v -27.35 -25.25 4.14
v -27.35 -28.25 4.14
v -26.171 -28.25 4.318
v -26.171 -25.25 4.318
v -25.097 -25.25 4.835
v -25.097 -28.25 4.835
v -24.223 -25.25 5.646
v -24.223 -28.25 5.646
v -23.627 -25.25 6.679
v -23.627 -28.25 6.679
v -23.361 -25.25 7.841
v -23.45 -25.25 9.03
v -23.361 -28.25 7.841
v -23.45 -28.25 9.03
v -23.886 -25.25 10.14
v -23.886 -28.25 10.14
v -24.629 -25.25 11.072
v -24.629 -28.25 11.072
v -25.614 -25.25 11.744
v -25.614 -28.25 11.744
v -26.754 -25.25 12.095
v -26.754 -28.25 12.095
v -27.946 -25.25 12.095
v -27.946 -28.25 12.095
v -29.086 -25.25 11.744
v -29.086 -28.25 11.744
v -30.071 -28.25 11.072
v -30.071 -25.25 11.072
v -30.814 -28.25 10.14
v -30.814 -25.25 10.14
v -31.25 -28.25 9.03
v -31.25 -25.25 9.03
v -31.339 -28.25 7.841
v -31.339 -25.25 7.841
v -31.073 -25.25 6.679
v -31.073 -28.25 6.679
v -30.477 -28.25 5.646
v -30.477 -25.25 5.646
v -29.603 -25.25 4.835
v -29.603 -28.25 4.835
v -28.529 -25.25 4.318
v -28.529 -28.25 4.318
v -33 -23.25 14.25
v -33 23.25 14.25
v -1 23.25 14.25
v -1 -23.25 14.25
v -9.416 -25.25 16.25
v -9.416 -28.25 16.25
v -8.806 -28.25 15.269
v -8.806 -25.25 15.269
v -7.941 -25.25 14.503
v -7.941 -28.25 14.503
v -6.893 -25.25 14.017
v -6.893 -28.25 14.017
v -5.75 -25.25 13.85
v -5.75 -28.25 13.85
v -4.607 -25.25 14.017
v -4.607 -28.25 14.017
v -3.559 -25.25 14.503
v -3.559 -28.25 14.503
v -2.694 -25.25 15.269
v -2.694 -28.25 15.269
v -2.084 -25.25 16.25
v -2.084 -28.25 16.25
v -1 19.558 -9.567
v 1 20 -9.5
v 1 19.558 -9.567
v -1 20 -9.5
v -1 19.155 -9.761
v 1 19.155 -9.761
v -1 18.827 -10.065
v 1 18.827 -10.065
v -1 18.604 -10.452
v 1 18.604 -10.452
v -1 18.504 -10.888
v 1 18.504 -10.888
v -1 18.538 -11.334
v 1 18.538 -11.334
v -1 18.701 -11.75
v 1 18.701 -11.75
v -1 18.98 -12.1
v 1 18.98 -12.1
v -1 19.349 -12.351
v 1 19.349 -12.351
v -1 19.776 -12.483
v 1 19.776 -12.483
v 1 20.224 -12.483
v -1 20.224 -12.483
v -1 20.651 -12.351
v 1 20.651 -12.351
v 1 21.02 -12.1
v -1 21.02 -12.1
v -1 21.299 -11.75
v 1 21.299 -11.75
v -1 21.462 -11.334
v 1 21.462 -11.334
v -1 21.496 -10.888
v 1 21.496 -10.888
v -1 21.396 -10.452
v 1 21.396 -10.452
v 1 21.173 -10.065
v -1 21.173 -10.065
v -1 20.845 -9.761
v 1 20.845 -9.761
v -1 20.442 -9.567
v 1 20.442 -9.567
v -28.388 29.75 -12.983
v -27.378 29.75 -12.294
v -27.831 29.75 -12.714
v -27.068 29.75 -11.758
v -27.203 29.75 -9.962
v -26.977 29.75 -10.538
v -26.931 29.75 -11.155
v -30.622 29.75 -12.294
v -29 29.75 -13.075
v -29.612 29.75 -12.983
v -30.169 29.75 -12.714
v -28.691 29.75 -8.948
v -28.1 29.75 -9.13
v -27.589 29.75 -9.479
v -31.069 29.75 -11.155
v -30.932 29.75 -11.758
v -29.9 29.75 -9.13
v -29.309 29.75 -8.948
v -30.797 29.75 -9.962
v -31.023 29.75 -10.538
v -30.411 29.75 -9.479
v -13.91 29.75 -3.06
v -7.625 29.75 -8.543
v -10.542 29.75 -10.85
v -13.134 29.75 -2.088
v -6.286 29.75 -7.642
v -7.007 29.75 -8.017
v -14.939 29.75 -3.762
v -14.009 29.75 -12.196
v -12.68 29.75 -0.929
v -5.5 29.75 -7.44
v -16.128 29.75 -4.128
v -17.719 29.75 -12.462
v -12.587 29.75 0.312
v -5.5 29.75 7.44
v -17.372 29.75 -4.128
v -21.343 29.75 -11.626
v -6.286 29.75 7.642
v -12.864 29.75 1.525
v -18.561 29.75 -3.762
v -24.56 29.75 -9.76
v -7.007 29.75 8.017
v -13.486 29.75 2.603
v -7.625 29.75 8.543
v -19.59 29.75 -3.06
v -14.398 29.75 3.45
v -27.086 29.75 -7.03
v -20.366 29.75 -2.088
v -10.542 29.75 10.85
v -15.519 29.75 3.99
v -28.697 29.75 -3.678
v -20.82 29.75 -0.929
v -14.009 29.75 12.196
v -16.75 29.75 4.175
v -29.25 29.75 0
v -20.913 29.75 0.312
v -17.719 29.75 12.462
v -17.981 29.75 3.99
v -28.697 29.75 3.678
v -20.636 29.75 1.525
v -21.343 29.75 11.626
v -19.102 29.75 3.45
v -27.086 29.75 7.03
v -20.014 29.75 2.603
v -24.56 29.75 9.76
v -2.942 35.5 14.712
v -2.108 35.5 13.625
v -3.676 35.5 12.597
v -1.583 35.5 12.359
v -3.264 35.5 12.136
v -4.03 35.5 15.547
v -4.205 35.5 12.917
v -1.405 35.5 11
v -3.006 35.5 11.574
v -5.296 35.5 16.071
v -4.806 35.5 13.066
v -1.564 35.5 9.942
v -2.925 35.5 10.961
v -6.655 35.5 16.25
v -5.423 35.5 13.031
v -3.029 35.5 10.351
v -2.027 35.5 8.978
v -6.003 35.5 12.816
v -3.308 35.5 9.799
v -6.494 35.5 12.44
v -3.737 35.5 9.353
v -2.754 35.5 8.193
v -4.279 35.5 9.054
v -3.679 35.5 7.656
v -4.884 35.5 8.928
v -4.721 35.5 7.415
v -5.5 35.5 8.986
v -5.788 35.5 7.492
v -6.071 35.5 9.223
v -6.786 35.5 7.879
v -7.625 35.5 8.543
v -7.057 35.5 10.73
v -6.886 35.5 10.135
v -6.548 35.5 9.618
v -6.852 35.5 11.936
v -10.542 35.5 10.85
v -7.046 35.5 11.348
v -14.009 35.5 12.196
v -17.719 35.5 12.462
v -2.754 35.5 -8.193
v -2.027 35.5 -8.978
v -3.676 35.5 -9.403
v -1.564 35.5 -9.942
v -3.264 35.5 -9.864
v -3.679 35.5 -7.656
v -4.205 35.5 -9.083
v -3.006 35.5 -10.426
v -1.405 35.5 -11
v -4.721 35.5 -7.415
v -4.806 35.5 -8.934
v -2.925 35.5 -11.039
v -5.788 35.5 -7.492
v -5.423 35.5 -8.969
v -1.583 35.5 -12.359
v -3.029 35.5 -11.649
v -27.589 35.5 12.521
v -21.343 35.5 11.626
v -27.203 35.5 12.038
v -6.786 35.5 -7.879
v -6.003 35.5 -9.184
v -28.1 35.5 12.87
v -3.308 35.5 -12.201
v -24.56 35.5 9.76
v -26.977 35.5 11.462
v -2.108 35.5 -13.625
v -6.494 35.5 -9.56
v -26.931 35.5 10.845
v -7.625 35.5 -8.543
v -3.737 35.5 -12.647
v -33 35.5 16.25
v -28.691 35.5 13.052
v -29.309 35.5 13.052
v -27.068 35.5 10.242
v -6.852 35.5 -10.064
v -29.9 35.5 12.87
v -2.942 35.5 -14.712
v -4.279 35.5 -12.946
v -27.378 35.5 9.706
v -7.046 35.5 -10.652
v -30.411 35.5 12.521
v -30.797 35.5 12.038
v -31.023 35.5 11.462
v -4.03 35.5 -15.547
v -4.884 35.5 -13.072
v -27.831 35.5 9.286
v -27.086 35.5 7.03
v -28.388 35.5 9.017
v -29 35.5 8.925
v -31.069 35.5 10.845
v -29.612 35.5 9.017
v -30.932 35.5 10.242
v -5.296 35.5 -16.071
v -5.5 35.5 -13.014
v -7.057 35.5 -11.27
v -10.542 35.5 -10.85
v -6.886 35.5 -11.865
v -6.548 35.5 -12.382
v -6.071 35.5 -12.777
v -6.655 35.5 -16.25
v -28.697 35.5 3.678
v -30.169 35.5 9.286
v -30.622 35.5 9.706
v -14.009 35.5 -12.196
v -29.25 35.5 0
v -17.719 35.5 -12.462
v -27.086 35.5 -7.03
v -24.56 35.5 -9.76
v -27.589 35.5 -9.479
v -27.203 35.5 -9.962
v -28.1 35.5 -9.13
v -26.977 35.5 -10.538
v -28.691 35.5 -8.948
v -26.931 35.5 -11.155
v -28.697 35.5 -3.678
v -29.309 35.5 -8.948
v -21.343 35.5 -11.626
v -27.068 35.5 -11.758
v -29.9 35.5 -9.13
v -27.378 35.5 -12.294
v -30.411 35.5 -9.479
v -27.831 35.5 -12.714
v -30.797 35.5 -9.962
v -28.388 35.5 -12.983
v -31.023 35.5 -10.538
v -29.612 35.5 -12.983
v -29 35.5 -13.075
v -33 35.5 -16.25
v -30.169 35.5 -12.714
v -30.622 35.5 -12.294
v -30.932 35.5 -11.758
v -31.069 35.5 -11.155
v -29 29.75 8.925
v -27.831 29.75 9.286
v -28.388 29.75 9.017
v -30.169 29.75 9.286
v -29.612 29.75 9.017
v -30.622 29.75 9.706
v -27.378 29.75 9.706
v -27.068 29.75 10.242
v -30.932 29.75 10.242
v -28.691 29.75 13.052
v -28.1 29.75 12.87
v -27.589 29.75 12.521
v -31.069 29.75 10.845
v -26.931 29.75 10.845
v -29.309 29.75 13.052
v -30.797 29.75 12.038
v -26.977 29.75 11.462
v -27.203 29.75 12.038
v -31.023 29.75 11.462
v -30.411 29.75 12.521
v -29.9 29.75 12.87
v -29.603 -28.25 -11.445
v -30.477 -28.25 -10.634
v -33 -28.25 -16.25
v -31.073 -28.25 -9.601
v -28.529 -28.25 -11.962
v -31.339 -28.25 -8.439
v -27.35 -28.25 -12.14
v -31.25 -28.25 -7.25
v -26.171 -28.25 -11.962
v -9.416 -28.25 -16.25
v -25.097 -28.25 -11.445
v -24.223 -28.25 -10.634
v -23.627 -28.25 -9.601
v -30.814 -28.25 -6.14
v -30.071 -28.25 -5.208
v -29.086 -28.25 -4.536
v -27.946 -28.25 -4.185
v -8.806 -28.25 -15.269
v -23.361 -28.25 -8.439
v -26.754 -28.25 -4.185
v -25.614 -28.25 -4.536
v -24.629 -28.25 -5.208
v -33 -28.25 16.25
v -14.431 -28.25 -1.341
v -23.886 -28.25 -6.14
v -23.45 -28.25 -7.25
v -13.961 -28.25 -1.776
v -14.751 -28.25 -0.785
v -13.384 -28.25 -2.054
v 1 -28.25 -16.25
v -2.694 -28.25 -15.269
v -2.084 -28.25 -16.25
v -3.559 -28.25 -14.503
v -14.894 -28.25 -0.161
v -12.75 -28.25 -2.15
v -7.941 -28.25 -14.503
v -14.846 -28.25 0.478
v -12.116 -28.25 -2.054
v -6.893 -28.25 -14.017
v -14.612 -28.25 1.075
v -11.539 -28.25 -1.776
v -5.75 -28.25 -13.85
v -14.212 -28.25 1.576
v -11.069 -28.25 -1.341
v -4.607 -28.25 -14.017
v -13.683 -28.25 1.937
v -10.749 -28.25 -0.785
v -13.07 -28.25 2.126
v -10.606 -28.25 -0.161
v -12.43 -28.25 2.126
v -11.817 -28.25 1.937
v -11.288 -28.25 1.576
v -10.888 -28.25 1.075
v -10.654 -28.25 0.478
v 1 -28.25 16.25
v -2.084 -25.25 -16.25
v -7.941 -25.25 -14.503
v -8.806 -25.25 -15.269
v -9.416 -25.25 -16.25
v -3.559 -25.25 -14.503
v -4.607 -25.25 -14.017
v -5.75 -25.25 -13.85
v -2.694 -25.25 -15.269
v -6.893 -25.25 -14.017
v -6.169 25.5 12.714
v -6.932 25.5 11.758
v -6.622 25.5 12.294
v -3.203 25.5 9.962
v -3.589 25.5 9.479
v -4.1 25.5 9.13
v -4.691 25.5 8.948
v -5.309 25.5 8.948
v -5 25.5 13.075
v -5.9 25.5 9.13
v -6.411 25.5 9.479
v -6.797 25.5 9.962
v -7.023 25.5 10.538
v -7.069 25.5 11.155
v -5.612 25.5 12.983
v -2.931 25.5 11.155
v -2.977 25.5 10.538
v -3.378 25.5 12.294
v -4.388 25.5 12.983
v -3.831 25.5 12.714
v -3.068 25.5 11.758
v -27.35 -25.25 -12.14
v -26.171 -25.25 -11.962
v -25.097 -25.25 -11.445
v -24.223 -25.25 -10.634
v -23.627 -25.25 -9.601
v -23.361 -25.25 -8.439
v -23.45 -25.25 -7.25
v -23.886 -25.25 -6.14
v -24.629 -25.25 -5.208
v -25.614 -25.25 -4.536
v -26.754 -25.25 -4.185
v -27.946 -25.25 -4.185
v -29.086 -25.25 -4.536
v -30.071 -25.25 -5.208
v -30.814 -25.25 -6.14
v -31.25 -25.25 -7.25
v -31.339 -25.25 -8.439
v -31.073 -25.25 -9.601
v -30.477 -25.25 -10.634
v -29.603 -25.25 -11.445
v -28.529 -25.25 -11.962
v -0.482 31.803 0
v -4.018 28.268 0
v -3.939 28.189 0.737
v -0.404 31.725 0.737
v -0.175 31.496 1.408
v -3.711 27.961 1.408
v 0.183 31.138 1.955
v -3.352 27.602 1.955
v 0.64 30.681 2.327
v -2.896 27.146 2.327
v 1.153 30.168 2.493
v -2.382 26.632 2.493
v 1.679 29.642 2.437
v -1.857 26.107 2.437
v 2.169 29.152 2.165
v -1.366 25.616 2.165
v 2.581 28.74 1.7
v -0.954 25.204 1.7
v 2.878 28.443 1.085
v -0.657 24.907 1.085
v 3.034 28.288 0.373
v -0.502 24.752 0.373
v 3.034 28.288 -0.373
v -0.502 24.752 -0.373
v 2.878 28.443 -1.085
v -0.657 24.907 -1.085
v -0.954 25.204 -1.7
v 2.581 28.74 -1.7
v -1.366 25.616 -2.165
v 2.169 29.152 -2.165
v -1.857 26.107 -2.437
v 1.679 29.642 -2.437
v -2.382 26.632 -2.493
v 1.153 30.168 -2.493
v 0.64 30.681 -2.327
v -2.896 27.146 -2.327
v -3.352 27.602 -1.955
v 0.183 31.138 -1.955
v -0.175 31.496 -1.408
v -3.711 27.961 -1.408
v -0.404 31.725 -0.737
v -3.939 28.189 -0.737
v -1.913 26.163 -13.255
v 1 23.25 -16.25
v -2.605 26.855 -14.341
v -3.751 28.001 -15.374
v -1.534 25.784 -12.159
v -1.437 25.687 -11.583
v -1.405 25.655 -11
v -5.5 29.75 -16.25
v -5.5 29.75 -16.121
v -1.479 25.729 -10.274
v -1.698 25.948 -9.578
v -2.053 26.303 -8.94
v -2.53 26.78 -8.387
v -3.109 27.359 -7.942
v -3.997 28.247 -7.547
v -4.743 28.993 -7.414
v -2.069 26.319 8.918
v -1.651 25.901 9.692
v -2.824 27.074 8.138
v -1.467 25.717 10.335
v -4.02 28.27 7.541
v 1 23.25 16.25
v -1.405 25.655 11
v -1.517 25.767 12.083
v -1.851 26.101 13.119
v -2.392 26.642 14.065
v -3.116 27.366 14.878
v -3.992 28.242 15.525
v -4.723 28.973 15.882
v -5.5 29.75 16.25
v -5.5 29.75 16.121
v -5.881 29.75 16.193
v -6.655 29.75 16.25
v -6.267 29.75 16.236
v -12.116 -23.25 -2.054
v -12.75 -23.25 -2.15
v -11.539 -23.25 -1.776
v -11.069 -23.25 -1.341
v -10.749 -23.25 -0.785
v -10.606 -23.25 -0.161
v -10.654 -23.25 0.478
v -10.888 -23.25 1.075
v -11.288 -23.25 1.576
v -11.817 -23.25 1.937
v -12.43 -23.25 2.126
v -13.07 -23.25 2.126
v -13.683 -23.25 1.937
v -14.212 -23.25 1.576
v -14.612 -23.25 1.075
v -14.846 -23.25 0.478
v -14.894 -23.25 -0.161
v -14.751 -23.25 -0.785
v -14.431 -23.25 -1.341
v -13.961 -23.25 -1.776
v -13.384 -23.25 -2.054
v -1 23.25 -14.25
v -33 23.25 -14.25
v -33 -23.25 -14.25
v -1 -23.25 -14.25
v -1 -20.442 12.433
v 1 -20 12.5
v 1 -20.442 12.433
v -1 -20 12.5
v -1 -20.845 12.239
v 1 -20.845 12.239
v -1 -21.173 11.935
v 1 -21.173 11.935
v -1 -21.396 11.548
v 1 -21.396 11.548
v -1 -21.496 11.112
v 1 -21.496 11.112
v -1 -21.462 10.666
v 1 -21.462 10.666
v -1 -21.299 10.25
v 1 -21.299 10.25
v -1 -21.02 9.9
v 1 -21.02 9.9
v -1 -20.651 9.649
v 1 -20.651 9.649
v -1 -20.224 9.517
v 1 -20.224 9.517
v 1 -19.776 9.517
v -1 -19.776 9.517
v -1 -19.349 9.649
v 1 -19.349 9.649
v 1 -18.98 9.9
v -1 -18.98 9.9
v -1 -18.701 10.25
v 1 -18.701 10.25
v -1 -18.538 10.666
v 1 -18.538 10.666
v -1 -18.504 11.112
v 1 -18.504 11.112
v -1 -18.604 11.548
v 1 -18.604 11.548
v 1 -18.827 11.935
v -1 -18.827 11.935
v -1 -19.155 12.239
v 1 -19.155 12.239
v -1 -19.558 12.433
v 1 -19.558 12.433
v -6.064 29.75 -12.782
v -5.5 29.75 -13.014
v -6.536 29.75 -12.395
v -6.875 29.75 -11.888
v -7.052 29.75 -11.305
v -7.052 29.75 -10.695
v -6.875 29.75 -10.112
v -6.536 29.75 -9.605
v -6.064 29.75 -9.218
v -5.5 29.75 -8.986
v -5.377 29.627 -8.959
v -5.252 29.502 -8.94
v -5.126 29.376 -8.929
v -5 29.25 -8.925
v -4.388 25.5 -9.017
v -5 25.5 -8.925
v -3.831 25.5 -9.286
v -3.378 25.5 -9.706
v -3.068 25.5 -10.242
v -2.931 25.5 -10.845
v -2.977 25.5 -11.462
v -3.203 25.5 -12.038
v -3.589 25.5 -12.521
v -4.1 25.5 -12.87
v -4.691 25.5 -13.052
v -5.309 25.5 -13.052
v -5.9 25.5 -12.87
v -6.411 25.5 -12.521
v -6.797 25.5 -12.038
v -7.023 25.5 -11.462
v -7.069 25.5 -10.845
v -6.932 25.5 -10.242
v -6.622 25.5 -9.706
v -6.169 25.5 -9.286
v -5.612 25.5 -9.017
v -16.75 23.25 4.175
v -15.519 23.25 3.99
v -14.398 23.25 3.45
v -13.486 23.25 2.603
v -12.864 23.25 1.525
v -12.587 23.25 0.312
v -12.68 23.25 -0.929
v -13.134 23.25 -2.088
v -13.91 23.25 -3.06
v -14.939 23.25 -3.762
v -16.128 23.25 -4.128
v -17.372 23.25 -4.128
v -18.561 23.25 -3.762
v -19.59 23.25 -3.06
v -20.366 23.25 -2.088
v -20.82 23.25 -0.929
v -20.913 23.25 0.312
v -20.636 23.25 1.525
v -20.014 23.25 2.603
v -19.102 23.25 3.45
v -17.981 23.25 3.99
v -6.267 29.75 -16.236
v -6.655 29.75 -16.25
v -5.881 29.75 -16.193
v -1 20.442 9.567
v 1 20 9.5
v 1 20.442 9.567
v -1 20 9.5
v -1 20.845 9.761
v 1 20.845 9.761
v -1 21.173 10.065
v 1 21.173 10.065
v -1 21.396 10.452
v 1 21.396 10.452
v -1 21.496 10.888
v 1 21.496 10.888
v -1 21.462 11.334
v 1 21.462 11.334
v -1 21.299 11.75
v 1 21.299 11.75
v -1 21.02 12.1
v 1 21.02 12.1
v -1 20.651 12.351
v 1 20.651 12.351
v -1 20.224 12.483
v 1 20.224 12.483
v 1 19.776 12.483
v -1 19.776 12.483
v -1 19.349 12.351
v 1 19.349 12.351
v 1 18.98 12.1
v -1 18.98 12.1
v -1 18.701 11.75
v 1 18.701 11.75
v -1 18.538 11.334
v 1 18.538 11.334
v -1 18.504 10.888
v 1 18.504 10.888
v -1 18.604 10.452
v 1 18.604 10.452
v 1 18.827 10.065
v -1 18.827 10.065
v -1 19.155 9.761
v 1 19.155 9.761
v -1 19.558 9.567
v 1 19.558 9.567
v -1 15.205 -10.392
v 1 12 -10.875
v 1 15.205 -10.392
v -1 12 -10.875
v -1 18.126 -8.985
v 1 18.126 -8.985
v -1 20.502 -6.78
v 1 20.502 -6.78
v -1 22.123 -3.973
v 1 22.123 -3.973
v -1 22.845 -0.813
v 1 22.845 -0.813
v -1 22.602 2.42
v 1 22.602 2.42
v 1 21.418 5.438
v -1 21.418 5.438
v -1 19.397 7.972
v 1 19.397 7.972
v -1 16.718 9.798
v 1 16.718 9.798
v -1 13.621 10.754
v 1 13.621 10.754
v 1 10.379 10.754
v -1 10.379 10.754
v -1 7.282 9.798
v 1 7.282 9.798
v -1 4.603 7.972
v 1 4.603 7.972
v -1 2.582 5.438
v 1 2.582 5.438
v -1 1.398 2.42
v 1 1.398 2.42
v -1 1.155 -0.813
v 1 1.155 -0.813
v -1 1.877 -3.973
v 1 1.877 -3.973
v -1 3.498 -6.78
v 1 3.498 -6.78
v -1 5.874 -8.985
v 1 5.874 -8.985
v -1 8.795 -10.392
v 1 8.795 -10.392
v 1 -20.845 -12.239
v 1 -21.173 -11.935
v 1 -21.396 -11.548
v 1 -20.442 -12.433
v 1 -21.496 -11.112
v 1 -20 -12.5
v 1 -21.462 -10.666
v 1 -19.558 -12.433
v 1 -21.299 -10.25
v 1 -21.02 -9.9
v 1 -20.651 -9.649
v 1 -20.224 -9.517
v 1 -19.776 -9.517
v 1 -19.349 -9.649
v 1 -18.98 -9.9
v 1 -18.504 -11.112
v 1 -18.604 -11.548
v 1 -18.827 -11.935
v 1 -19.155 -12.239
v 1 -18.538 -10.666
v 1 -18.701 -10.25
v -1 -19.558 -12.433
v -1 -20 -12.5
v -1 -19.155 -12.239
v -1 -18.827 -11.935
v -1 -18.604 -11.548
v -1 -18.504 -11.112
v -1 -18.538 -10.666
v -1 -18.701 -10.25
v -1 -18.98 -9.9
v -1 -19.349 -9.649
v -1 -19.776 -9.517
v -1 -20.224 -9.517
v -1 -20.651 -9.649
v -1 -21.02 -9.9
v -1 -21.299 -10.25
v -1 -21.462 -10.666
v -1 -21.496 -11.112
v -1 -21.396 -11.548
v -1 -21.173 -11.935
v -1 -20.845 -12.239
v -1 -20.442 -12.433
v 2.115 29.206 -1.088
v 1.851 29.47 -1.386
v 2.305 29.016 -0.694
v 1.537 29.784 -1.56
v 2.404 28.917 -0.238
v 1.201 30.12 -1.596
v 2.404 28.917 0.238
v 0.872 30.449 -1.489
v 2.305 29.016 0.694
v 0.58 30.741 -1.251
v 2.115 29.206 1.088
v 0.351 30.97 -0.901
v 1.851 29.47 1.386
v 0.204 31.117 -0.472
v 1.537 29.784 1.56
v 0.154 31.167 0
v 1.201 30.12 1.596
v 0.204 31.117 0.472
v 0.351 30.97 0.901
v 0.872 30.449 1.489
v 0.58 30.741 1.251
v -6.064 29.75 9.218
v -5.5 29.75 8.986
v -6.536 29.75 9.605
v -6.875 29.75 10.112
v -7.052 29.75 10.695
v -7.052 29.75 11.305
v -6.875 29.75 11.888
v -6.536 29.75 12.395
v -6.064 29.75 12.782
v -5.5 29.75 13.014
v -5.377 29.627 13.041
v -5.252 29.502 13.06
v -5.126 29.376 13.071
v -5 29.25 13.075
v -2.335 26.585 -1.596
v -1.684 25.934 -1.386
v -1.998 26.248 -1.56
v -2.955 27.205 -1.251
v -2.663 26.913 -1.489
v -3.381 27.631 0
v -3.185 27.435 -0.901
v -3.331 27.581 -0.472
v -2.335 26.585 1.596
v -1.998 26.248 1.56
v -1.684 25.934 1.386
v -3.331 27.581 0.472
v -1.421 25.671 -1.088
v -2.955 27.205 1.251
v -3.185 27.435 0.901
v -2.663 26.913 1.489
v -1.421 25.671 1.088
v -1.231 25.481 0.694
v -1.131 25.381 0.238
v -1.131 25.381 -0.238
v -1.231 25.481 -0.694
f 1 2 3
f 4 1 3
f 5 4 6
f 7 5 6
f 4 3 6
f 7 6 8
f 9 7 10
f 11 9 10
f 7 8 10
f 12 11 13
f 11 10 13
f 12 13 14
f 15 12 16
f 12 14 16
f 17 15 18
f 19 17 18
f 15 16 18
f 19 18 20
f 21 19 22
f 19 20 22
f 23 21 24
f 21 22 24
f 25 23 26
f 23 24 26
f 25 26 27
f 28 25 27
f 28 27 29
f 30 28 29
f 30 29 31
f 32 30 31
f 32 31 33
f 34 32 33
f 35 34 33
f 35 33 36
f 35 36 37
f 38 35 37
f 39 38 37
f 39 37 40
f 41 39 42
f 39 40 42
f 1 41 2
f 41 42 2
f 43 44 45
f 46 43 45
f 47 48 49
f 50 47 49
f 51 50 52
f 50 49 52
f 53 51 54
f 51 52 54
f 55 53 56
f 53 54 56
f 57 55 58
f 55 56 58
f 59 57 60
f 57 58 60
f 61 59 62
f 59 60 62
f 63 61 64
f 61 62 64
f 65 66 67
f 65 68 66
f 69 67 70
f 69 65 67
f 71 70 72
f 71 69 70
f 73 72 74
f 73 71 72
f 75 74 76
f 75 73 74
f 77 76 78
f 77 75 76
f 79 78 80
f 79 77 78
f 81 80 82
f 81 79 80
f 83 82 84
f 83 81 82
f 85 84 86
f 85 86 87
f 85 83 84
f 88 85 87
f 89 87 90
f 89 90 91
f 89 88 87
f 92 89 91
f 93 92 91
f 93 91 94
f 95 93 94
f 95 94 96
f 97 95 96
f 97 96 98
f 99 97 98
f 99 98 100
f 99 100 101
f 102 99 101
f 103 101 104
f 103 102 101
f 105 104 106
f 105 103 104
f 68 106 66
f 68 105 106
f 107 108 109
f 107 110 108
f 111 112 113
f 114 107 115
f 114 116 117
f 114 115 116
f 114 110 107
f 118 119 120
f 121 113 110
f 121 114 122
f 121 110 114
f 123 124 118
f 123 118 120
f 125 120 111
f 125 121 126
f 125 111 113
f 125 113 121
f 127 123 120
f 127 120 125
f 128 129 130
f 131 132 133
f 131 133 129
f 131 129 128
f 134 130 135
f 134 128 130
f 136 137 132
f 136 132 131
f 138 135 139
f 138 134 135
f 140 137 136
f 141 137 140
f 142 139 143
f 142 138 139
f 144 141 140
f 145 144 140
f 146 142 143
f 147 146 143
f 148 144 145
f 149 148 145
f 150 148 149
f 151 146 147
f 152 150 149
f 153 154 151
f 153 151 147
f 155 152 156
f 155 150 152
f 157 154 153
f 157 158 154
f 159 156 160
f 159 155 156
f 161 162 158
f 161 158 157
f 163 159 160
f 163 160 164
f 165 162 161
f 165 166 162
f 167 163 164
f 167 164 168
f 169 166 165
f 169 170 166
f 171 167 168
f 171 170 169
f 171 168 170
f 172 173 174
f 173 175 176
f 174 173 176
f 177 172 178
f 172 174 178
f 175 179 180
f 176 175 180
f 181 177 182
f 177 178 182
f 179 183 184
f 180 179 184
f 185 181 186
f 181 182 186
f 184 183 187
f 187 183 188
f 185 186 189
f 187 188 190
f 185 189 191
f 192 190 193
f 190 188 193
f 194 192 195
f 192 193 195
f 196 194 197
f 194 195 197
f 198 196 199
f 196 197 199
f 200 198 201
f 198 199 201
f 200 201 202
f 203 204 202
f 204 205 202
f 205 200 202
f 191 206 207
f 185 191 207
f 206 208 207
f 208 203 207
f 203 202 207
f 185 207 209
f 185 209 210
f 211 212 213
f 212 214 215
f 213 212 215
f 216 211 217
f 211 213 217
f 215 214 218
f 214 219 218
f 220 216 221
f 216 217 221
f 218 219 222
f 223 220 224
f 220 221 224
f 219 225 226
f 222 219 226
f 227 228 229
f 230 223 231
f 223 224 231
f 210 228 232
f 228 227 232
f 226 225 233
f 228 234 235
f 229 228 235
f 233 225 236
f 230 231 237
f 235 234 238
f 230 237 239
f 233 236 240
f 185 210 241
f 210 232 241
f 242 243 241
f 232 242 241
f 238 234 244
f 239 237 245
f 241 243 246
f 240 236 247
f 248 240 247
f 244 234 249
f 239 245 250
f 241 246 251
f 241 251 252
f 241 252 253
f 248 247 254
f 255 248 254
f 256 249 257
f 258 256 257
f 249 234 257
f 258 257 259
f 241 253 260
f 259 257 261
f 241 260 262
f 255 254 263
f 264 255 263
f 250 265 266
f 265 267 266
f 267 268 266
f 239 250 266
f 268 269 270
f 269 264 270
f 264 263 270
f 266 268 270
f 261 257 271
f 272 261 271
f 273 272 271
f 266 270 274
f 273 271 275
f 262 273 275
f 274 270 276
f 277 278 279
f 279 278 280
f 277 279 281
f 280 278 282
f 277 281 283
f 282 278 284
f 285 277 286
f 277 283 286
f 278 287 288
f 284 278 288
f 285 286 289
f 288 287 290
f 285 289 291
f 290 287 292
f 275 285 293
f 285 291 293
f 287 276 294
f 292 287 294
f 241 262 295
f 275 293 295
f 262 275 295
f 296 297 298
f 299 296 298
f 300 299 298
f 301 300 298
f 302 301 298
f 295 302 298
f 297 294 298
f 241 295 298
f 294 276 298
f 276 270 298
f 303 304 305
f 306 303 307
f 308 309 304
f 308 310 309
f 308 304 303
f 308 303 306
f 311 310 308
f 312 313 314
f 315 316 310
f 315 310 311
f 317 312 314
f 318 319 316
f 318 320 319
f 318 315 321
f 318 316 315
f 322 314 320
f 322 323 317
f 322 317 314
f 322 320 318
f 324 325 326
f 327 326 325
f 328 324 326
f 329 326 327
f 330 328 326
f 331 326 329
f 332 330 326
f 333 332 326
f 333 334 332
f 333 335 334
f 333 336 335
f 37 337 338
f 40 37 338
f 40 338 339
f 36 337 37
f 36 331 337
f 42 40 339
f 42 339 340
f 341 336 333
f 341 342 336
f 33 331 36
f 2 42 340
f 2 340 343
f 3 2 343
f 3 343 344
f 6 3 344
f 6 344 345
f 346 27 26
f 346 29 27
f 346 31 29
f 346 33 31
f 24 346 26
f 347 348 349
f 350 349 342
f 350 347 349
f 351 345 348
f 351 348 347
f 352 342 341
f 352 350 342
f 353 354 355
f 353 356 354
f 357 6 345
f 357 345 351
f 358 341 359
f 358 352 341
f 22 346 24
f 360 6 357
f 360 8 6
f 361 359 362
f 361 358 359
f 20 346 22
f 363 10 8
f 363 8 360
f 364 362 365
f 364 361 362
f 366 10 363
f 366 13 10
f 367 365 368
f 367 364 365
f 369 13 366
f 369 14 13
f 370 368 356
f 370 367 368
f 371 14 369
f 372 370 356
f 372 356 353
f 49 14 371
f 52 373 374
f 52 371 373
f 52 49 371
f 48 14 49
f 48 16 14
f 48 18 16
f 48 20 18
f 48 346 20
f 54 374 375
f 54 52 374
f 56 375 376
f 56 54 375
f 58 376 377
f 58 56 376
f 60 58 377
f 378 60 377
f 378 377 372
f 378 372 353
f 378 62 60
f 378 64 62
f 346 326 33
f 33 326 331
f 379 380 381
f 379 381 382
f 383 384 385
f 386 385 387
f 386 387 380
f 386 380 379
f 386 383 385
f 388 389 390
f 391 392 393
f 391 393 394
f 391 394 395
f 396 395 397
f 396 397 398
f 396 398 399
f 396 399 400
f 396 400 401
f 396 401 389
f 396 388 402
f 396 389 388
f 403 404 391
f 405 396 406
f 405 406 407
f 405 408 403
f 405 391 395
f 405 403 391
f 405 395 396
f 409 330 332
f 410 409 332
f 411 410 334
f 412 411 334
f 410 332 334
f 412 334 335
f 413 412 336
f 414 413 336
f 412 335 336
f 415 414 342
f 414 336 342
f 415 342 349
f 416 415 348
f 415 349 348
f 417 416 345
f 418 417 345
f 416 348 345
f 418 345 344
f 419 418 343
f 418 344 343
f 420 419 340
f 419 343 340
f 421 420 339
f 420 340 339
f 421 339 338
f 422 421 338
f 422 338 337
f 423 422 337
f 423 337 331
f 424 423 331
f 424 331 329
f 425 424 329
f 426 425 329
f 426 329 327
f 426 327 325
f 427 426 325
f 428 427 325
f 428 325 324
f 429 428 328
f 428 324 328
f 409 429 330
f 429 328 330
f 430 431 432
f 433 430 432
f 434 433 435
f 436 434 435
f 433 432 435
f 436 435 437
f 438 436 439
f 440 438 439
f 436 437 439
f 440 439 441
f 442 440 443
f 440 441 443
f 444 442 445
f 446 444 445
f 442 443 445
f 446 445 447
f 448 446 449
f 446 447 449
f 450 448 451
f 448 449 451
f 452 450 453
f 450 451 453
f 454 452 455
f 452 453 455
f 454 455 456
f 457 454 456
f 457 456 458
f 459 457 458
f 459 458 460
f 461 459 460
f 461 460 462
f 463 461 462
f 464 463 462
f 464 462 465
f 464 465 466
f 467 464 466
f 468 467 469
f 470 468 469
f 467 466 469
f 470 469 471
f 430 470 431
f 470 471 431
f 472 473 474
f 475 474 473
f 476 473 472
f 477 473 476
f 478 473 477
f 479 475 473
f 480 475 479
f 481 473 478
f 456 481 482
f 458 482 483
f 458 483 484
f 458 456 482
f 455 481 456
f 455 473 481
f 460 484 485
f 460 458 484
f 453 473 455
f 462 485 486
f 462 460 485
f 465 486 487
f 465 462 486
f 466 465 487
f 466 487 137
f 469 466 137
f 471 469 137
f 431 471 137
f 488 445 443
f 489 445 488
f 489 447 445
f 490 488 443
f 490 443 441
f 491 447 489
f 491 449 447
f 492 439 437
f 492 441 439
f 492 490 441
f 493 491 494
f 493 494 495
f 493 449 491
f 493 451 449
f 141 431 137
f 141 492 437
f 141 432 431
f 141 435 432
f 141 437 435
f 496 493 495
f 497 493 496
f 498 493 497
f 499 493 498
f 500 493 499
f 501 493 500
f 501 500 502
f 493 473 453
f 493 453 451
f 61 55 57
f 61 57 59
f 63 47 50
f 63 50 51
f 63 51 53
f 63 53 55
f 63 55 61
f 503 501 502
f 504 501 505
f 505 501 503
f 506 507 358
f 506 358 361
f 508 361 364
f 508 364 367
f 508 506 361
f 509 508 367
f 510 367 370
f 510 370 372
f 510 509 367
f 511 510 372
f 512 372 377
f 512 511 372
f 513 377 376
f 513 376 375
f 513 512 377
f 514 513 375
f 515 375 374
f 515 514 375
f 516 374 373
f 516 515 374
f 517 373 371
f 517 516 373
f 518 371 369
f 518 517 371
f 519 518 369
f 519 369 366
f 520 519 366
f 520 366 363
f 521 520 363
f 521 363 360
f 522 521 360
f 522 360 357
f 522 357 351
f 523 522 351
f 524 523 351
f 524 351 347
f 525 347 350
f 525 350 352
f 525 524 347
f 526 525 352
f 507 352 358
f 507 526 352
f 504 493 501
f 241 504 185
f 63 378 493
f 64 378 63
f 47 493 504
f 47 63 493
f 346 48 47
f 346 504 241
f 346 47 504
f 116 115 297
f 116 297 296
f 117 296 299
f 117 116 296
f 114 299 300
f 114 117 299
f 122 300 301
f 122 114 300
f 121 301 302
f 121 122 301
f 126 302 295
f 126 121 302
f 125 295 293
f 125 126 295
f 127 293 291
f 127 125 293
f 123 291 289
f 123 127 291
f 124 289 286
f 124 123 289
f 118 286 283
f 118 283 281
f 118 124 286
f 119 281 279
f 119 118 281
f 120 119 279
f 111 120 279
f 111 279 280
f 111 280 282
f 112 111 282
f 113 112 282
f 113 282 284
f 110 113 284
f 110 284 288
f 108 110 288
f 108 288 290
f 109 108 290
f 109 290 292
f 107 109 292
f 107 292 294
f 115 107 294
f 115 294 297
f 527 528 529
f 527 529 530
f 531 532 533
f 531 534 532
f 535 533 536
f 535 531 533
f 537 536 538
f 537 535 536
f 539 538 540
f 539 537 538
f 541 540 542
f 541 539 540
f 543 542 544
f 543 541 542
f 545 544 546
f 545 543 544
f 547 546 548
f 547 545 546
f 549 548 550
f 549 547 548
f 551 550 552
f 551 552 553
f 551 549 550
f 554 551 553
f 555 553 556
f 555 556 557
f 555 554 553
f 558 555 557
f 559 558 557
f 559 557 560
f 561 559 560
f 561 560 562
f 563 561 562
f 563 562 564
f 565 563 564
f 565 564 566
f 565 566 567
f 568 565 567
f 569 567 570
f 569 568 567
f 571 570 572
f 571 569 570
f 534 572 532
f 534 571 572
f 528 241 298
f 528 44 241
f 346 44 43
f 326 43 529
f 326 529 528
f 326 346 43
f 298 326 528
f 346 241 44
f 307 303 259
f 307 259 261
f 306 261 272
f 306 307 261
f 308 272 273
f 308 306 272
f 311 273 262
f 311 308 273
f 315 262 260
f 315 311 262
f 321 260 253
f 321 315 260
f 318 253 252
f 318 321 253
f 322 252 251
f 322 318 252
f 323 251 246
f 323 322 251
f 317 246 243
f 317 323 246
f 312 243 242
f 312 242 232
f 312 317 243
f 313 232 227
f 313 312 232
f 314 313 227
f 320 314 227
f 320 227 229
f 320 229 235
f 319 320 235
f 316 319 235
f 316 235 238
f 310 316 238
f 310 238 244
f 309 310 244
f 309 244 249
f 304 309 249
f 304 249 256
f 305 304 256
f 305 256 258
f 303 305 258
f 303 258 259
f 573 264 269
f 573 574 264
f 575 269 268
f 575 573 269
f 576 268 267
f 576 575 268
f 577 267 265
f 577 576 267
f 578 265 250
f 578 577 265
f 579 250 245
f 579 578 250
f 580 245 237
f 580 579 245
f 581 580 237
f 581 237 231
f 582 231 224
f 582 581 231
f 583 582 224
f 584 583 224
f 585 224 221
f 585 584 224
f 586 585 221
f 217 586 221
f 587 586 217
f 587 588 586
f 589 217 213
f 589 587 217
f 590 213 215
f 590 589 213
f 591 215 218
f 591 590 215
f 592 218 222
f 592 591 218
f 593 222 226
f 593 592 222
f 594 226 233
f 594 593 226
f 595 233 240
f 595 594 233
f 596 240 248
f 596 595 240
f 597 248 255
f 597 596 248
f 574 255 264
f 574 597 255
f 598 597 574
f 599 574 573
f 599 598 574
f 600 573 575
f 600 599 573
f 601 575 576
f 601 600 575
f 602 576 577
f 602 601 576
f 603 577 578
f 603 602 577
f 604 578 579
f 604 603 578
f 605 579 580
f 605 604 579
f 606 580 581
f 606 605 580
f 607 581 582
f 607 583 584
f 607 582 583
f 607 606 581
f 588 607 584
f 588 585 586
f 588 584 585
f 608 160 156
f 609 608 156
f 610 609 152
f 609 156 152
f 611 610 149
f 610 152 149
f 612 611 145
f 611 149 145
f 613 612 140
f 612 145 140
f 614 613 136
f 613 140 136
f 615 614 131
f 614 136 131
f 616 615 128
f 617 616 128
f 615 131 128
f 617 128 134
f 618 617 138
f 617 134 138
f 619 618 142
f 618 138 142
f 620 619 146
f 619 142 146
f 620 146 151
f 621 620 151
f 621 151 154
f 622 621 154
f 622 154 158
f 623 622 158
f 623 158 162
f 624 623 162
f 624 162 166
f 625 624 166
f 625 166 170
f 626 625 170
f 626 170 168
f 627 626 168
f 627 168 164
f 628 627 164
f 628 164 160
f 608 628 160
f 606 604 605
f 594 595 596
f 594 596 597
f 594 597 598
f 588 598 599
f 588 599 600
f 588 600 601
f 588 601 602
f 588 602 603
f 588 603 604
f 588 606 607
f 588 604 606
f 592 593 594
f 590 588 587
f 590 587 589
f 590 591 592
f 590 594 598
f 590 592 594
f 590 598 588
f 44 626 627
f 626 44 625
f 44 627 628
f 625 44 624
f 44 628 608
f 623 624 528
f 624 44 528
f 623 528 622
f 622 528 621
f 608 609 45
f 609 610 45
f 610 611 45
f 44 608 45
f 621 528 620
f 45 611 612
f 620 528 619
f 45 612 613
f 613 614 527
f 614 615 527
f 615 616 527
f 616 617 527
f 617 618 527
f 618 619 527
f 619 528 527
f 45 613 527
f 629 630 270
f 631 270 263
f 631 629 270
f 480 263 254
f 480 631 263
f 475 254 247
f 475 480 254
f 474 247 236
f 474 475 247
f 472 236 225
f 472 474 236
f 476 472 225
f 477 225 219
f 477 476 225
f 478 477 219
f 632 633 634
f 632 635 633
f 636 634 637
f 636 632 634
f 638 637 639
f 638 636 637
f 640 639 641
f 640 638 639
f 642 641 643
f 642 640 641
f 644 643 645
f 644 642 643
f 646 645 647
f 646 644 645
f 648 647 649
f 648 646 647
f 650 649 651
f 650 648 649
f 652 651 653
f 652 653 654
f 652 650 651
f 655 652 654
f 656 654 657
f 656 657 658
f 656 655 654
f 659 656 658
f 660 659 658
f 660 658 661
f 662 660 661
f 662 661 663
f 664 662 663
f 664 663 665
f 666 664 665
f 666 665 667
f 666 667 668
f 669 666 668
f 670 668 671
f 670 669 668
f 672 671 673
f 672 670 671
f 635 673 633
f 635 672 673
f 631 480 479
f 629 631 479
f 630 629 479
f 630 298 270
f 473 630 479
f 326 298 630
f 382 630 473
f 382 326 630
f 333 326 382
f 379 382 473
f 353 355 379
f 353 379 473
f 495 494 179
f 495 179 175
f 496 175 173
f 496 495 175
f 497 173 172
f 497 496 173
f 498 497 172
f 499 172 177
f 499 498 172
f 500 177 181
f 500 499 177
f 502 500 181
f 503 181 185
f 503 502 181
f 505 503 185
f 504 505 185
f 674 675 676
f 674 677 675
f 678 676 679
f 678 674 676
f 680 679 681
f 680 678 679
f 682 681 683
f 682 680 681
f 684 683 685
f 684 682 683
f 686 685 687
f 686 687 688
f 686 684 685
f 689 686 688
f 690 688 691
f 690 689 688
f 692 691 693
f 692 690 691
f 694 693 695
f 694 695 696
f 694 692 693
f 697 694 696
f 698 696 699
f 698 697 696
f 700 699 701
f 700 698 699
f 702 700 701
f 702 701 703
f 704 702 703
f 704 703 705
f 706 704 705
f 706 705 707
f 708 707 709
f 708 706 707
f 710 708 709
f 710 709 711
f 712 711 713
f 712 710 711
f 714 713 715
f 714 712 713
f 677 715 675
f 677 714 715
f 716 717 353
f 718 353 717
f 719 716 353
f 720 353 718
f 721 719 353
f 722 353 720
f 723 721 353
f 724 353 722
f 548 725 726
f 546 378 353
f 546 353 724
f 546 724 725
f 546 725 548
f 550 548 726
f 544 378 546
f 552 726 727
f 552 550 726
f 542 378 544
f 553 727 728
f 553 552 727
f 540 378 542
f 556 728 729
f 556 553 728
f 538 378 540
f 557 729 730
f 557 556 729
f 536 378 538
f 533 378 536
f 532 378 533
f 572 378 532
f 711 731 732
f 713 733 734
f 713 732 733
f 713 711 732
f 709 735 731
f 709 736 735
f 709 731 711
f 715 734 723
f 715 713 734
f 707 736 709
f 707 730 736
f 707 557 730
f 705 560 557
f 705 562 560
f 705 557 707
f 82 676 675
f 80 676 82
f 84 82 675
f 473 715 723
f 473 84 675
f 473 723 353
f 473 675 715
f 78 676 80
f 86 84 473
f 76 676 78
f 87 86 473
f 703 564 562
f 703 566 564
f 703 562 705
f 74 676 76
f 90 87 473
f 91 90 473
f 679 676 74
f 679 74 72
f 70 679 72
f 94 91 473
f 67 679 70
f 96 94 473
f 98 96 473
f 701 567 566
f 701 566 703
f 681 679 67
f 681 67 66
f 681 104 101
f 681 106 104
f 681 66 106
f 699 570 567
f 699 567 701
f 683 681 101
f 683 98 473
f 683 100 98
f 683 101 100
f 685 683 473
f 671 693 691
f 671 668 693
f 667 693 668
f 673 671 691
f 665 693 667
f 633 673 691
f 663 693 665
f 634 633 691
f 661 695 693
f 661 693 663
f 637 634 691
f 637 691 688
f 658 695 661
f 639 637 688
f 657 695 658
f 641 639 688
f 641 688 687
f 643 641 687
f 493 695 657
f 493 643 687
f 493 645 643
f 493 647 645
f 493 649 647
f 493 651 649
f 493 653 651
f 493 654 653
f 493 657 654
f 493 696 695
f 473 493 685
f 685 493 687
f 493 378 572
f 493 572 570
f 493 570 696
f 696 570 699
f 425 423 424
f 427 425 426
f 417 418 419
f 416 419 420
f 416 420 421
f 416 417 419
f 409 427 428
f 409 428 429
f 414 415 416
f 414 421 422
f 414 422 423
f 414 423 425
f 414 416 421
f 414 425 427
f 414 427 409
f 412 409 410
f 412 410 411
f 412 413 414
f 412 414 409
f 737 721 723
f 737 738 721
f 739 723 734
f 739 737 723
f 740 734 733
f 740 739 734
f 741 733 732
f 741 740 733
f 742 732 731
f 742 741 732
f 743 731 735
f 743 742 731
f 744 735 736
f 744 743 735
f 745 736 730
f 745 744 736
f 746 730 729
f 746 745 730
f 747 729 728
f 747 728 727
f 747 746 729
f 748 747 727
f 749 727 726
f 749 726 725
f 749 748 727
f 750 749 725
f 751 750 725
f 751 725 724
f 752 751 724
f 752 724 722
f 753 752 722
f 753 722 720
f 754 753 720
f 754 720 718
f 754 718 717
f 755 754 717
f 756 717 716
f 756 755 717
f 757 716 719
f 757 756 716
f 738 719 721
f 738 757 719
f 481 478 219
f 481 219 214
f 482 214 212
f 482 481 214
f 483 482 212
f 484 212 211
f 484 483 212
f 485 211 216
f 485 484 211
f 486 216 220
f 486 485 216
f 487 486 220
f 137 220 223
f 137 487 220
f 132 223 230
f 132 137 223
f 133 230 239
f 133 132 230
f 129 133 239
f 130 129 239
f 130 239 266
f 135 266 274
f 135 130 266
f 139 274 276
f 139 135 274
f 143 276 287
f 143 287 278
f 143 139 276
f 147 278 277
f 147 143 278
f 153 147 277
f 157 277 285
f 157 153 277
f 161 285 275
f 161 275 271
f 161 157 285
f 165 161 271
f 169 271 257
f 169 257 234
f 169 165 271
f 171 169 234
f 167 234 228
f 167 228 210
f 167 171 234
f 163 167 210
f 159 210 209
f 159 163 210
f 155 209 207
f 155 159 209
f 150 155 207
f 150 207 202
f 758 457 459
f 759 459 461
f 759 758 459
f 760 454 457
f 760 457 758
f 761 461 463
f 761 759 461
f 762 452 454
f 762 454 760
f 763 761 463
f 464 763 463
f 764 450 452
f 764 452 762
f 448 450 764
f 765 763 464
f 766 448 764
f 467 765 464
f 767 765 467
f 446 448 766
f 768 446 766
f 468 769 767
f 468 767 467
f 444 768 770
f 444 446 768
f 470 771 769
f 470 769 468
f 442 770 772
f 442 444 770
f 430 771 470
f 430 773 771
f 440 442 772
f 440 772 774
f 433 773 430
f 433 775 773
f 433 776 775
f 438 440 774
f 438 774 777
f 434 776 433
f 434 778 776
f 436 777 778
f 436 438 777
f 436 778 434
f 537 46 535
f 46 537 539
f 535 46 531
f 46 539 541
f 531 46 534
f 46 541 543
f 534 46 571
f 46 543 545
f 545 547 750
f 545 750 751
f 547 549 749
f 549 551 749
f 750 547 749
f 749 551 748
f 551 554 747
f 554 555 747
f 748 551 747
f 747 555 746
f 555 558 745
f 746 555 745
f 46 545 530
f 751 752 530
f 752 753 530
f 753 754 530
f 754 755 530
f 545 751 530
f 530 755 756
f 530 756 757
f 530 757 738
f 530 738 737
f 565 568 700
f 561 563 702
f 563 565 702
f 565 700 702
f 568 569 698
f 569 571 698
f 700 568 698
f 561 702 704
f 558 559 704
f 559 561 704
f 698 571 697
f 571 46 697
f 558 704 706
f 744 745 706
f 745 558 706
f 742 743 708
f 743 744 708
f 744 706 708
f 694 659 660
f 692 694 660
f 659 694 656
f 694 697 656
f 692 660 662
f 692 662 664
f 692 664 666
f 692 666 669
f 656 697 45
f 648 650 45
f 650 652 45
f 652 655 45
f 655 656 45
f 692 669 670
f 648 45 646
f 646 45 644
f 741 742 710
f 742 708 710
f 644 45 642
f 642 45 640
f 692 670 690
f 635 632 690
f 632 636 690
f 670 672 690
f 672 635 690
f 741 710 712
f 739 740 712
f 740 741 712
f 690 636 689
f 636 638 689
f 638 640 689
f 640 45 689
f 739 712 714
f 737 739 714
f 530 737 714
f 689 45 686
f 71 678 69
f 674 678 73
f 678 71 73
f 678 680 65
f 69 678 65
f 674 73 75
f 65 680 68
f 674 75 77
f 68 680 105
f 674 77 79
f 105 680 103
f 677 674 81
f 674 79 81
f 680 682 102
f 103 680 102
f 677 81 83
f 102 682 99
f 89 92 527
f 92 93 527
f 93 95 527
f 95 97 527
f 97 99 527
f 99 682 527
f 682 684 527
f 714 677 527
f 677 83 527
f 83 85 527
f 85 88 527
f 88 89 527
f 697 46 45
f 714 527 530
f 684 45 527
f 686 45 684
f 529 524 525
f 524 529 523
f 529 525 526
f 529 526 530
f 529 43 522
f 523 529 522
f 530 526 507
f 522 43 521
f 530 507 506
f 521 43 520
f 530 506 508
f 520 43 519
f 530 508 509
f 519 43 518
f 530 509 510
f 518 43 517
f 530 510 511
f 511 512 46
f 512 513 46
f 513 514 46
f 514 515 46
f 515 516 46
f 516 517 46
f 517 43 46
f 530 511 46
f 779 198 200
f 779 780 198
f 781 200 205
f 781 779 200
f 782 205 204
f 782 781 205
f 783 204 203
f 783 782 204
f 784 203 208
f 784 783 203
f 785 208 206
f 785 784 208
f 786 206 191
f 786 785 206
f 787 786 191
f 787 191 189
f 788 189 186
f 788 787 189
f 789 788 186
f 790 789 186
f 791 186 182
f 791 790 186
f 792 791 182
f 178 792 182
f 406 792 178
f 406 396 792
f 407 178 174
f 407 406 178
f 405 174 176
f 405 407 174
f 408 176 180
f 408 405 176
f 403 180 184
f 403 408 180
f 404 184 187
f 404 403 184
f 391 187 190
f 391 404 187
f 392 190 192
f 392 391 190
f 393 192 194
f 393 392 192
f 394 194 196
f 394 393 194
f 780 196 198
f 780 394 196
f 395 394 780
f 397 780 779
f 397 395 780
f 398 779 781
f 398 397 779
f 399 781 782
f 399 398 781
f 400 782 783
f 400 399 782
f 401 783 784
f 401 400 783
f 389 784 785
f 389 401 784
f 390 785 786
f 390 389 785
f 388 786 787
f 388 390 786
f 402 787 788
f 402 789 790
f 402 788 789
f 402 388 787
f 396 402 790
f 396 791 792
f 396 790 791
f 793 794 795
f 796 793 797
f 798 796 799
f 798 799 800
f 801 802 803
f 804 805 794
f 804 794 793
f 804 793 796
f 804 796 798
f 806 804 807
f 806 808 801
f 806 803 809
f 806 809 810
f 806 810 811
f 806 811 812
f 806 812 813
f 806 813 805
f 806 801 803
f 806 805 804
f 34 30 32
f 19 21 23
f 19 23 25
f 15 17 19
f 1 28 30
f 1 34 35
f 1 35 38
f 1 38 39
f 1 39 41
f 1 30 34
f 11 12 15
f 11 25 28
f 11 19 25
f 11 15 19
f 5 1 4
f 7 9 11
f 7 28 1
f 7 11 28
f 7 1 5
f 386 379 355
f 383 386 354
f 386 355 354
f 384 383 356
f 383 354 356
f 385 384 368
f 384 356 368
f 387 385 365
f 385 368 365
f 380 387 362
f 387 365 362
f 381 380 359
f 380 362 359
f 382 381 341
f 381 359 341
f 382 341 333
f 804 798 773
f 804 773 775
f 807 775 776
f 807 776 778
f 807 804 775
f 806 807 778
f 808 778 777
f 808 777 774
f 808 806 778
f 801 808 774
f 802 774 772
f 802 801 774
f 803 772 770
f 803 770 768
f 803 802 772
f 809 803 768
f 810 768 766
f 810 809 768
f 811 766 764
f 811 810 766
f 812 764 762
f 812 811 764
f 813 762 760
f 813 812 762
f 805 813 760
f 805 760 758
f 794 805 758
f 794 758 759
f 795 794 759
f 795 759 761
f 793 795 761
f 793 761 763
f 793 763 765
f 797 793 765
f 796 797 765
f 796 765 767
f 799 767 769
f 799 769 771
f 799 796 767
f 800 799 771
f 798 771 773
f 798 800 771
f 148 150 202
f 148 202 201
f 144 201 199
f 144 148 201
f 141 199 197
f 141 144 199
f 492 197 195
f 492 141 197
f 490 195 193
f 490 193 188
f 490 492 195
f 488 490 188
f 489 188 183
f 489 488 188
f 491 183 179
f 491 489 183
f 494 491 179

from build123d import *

# Parameters (mm, degrees)
SKETCH1_W           = 28.5
SKETCH1_H           = 46.5
SKETCH1_R           = 1.5
SKETCH1_R_2         = 10.875
BOSS_EXTRUDE1_DEPTH = 1
SKETCH2_W           = 34
SKETCH2_H           = 28.5
BOSS_EXTRUDE2_DEPTH = 6.5
CUT_EXTRUDE1_REACH  = 66.04
SKETCH4_R           = 4.175
SKETCH15_W          = 34
SKETCH15_H          = 28.5
SKETCH15_R          = 2.15
BOSS_EXTRUDE8_DEPTH = 5
CHAMFER1_SIZE       = 6.5
BOSS_EXTRUDE9_DEPTH = 2
SKETCH5_R           = 2.5
BOSS_EXTRUDE4_DEPTH = 5
CUT_EXTRUDE4_START  = -5
SKETCH7_R           = 1.6
CUT_EXTRUDE4_DEPTH  = 5
SKETCH10_R          = 2.075
BOSS_EXTRUDE6_DEPTH = 12.25
CUT_EXTRUDE7_START  = -10
SKETCH18_R          = 2.075
CUT_EXTRUDE7_DEPTH  = 10
SKETCH19_R          = 4
CUT_EXTRUDE8_DEPTH  = 3


with BuildPart() as part:
    # Sketch1 → Boss-Extrude1 (new, symmetric)
    with BuildSketch(Plane(origin=(0, 0, 0), x_dir=(0, 0, -1), z_dir=(1, 0, 0))):
        Rectangle(SKETCH1_W, SKETCH1_H)
        with Locations((-11, 20)):
            Circle(SKETCH1_R, mode=Mode.SUBTRACT)
        with Locations(Location((11, 20, 0), (0, 0, 180))):
            Circle(SKETCH1_R, mode=Mode.SUBTRACT)
        with Locations((11, -20)):
            Circle(SKETCH1_R, mode=Mode.SUBTRACT)
        with Locations(Location((-11, -20, 0), (0, 0, 180))):
            Circle(SKETCH1_R, mode=Mode.SUBTRACT)
        with Locations((0, 12)):
            Circle(SKETCH1_R_2, mode=Mode.SUBTRACT)
    extrude(amount=BOSS_EXTRUDE1_DEPTH, both=True)

    # Sketch2 → Boss-Extrude2 (add)
    with BuildSketch(Plane(origin=(0, 23.25, 0), x_dir=(1, 0, 0), z_dir=(0, 1, 0))):
        with Locations((-16, 0)):
            Rectangle(SKETCH2_W, SKETCH2_H)
    extrude(amount=BOSS_EXTRUDE2_DEPTH)

    # Sketch4 → Cut-Extrude1 (cut, up to next)
    with BuildSketch(Plane(origin=(0, 29.75, 0), x_dir=(1, 0, 0), z_dir=(0, 1, 0)), mode=Mode.PRIVATE) as cut_extrude1_sk1:
        with Locations(Location((-16.75, 0, 0), (0, 0, 270))):
            Circle(SKETCH4_R)
    cut_extrude1_tool1 = extrude(cut_extrude1_sk1.sketch, amount=-CUT_EXTRUDE1_REACH, mode=Mode.PRIVATE) & part.part
    add(cut_extrude1_tool1.solids().sort_by_distance((-16.75, 29.75, 0))[0], mode=Mode.SUBTRACT)

    # Sketch15 → Boss-Extrude8 (add)
    with BuildSketch(Plane.XZ.offset(23.25)):
        with Locations((-16, 0)):
            Rectangle(SKETCH15_W, SKETCH15_H)
        with Locations(Location((-12.75, 0, 0), (0, 0, 270))):
            Circle(SKETCH15_R, mode=Mode.SUBTRACT)
    extrude(amount=BOSS_EXTRUDE8_DEPTH)

    # Chamfer1
    chamfer1_edges = [part.edges().sort_by_distance(p)[0] for p in [
        (1, 29.75, 0),
    ]]
    chamfer(chamfer1_edges, length=CHAMFER1_SIZE)

    # Sketch17 → Boss-Extrude9 (add)
    with BuildSketch(Plane.XY.offset(14.25)):
        Polygon((-33, 29.75), (-33, -28.25), (1, -28.25), (1, 23.25), (-5.5, 29.75), align=None)
    boss_extrude9 = extrude(amount=BOSS_EXTRUDE9_DEPTH)

    # Mirror3: Boss-Extrude9 across plane
    add(boss_extrude9.mirror(Plane.XY))

    # Sketch5 → Boss-Extrude4 (add)
    with BuildSketch(Plane(origin=(12.125, 12.125, 0), x_dir=(0, 0, -1), z_dir=(0.7071067811865487, 0.7071067811865464, 0))):
        with Locations(Location((0, 20.329319959, 0), (0, 0, 90))):
            Circle(SKETCH5_R)
    extrude(amount=BOSS_EXTRUDE4_DEPTH)

    # Sketch7 → Cut-Extrude4 (cut)
    with BuildSketch(Plane(origin=(15.660533906, 15.660533906, 0), x_dir=(0, 0, -1), z_dir=(0.7071067811865487, 0.7071067811865464, 0)).offset(CUT_EXTRUDE4_START)):
        with Locations(Location((0, 20.329319959, 0), (0, 0, 90))):
            Circle(SKETCH7_R)
    extrude(amount=CUT_EXTRUDE4_DEPTH, mode=Mode.SUBTRACT)

    # Sketch10 → Boss-Extrude6 (add)
    with BuildSketch(Plane(origin=(0, 23.25, 0), x_dir=(1, 0, 0), z_dir=(0, 1, 0))):
        with BuildLine():
            Line((-33, -16.25), (-33, 16.25))
            Line((-33, 16.25), (-6.654581397, 16.25))
            ThreePointArc((-6.654581397, 16.25), (-2.942270796, 14.712310601), (-1.404581397, 11))
            ThreePointArc((-1.404581397, 11), (-3.679011202, 7.656046722), (-7.624732517, 8.542803601))
            ThreePointArc((-7.624732517, 8.542803601), (-29.25, 0), (-7.624732517, -8.542803601))
            ThreePointArc((-7.624732517, -8.542803601), (-3.679011202, -7.656046722), (-1.404581397, -11))
            ThreePointArc((-1.404581397, -11), (-2.942270796, -14.712310601), (-6.654581397, -16.25))
            Line((-6.654581397, -16.25), (-33, -16.25))
        make_face()
        with Locations(Location((-29, 11, 0), (0, 0, 90))):
            Circle(SKETCH10_R, mode=Mode.SUBTRACT)
        with Locations(Location((-29, -11, 0), (0, 0, 90))):
            Circle(SKETCH10_R, mode=Mode.SUBTRACT)
        with Locations(Location((-5, 11, 0), (0, 0, 103.943434861))):
            Circle(SKETCH10_R, mode=Mode.SUBTRACT)
        with Locations(Location((-5, -11, 0), (0, 0, 103.943434861))):
            Circle(SKETCH10_R, mode=Mode.SUBTRACT)
    extrude(amount=BOSS_EXTRUDE6_DEPTH)

    # Sketch18 → Cut-Extrude7 (cut)
    with BuildSketch(Plane(origin=(0, 35.5, 0), x_dir=(1, 0, 0), z_dir=(0, 1, 0)).offset(CUT_EXTRUDE7_START)):
        with Locations(Location((-5, -11, 0), (0, 0, 270))):
            Circle(SKETCH18_R)
        with Locations(Location((-5, 11, 0), (0, 0, 270))):
            Circle(SKETCH18_R)
    extrude(amount=CUT_EXTRUDE7_DEPTH, mode=Mode.SUBTRACT)

    # Sketch19 → Cut-Extrude8 (cut)
    with BuildSketch(Plane.XZ.offset(28.25)):
        with Locations((-5.75, 17.85)):
            Circle(SKETCH19_R)
        with Locations((-5.75, -17.85)):
            Circle(SKETCH19_R)
        with Locations(Location((-27.35, 8.14, 0), (0, 0, 270))):
            Circle(SKETCH19_R)
        with Locations(Location((-27.35, -8.14, 0), (0, 0, 270))):
            Circle(SKETCH19_R)
    extrude(amount=-CUT_EXTRUDE8_DEPTH, mode=Mode.SUBTRACT)


solid = part.part
